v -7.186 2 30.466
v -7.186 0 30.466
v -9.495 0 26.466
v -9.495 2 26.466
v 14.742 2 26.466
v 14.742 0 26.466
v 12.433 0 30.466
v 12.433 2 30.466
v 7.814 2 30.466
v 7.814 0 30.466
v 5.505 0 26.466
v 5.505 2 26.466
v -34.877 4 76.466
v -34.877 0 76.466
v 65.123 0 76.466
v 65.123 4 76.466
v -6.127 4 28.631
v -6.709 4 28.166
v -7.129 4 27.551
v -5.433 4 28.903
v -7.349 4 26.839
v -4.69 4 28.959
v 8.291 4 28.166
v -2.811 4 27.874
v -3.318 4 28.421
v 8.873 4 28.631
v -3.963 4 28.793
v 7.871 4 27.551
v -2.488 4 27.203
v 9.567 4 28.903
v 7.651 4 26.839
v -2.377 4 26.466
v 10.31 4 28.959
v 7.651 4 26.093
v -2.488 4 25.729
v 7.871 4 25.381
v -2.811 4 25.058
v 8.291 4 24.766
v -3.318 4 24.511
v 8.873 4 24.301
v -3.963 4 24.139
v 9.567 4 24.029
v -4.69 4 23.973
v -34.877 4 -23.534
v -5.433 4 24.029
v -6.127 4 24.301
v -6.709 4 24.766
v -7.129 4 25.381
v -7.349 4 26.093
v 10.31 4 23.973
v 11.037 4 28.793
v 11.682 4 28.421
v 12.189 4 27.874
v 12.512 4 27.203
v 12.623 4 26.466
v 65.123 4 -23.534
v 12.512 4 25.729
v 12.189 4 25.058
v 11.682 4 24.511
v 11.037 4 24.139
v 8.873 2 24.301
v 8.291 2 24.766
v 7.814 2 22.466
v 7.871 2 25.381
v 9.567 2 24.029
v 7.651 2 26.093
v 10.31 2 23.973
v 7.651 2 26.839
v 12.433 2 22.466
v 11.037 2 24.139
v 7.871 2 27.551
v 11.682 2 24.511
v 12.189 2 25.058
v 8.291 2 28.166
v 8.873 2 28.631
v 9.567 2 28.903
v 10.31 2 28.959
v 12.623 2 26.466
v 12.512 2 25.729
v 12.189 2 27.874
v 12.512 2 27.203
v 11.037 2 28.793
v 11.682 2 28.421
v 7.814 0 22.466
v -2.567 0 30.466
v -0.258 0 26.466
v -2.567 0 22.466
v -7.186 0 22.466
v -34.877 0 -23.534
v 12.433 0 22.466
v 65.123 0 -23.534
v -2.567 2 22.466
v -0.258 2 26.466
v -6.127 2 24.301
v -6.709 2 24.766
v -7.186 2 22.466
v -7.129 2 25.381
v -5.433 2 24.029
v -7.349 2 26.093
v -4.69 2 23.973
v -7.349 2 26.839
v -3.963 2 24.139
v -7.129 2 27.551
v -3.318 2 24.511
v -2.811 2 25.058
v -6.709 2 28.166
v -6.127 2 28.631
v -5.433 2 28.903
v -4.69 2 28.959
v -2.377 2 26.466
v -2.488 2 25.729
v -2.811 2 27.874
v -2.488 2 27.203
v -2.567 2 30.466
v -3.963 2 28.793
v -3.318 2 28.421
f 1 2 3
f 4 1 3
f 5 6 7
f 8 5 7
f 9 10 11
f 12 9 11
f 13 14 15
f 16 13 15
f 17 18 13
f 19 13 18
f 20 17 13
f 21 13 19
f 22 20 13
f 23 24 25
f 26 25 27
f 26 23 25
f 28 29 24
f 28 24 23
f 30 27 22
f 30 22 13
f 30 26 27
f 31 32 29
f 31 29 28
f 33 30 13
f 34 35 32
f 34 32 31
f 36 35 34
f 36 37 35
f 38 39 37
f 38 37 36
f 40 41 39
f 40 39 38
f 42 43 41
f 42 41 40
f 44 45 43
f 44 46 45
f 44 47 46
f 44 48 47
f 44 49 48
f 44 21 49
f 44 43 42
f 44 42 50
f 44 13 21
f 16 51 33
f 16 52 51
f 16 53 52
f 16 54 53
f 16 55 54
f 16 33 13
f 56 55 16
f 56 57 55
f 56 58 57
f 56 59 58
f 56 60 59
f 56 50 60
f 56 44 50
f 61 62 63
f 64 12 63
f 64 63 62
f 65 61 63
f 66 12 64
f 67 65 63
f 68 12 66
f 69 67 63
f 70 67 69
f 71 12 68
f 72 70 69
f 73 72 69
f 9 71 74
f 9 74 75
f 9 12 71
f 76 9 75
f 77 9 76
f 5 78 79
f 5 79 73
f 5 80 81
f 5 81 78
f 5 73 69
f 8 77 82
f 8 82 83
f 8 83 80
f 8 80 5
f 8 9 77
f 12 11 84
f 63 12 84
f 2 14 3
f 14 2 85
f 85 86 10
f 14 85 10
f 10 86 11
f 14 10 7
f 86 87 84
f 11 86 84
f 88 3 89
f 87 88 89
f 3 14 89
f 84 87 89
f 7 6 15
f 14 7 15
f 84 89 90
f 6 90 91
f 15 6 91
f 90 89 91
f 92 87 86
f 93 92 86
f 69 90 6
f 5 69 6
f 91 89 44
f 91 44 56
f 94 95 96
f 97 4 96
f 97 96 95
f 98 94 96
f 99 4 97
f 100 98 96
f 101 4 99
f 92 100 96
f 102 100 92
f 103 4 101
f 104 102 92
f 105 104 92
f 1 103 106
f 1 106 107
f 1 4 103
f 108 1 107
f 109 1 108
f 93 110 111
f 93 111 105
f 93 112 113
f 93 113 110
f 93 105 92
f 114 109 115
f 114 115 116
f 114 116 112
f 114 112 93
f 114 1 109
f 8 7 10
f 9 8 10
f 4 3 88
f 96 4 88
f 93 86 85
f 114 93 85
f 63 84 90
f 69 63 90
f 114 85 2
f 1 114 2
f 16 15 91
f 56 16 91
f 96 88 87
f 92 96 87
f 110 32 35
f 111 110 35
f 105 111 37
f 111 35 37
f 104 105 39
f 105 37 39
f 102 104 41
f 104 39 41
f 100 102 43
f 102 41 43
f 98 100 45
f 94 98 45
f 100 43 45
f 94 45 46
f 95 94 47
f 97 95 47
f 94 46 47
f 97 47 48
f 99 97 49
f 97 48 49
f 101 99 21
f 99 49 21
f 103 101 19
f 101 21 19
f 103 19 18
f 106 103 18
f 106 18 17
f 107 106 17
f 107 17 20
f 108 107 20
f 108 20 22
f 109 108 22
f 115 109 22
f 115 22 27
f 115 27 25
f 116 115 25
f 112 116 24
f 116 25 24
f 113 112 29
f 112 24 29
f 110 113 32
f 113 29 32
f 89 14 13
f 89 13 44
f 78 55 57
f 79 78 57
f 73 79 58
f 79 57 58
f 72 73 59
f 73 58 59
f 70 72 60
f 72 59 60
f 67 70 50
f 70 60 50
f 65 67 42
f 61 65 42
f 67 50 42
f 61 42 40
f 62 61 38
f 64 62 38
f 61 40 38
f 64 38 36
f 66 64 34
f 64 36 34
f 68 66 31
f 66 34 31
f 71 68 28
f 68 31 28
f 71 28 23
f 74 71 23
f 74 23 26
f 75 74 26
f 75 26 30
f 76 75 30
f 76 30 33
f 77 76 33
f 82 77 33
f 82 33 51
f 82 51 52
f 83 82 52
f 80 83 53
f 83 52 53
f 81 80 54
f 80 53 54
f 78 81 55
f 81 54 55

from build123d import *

# Parameters (mm, degrees)
SKETCH1_W           = 100
SKETCH1_H           = 100
BOSS_EXTRUDE1_DEPTH = 4
SKETCH3_R           = 2.5
CUT_EXTRUDE1_DEPTH  = 2
CUT_EXTRUDE2_DEPTH  = 2


with BuildPart() as part:
    # Sketch1 → Boss-Extrude1 (new body)
    with BuildSketch(Plane(origin=(0, 0, 0), x_dir=(1, 0, 0), z_dir=(0, 1, 0))):
        with Locations((15.12345679, -26.466049383)):
            Rectangle(SKETCH1_W, SKETCH1_H)
    extrude(amount=BOSS_EXTRUDE1_DEPTH)

    # Sketch3 → Cut-Extrude1 (cut)
    with BuildSketch(Plane(origin=(0, 4, 0), x_dir=(1, 0, 0), z_dir=(0, 1, 0))):
        with Locations((-4.87654321, -26.466049383)):
            Circle(SKETCH3_R)
        with Locations((10.12345679, -26.466049383)):
            Circle(SKETCH3_R)
    extrude(amount=-CUT_EXTRUDE1_DEPTH, mode=Mode.SUBTRACT)

    # Sketch5 → Cut-Extrude2 (cut)
    with BuildSketch(Plane.XZ):
        Polygon((-0.257741056, 26.466049383), (-2.567142133, 30.466049383), (-7.185944287, 30.466049383), (-9.495345363, 26.466049383), (-7.185944287, 22.466049383), (-2.567142133, 22.466049383), align=None)
        Polygon((14.742258944, 26.466049383), (12.432857867, 30.466049383), (7.814055713, 30.466049383), (5.504654637, 26.466049383), (7.814055713, 22.466049383), (12.432857867, 22.466049383), align=None)
    extrude(amount=-CUT_EXTRUDE2_DEPTH, mode=Mode.SUBTRACT)


solid = part.part
